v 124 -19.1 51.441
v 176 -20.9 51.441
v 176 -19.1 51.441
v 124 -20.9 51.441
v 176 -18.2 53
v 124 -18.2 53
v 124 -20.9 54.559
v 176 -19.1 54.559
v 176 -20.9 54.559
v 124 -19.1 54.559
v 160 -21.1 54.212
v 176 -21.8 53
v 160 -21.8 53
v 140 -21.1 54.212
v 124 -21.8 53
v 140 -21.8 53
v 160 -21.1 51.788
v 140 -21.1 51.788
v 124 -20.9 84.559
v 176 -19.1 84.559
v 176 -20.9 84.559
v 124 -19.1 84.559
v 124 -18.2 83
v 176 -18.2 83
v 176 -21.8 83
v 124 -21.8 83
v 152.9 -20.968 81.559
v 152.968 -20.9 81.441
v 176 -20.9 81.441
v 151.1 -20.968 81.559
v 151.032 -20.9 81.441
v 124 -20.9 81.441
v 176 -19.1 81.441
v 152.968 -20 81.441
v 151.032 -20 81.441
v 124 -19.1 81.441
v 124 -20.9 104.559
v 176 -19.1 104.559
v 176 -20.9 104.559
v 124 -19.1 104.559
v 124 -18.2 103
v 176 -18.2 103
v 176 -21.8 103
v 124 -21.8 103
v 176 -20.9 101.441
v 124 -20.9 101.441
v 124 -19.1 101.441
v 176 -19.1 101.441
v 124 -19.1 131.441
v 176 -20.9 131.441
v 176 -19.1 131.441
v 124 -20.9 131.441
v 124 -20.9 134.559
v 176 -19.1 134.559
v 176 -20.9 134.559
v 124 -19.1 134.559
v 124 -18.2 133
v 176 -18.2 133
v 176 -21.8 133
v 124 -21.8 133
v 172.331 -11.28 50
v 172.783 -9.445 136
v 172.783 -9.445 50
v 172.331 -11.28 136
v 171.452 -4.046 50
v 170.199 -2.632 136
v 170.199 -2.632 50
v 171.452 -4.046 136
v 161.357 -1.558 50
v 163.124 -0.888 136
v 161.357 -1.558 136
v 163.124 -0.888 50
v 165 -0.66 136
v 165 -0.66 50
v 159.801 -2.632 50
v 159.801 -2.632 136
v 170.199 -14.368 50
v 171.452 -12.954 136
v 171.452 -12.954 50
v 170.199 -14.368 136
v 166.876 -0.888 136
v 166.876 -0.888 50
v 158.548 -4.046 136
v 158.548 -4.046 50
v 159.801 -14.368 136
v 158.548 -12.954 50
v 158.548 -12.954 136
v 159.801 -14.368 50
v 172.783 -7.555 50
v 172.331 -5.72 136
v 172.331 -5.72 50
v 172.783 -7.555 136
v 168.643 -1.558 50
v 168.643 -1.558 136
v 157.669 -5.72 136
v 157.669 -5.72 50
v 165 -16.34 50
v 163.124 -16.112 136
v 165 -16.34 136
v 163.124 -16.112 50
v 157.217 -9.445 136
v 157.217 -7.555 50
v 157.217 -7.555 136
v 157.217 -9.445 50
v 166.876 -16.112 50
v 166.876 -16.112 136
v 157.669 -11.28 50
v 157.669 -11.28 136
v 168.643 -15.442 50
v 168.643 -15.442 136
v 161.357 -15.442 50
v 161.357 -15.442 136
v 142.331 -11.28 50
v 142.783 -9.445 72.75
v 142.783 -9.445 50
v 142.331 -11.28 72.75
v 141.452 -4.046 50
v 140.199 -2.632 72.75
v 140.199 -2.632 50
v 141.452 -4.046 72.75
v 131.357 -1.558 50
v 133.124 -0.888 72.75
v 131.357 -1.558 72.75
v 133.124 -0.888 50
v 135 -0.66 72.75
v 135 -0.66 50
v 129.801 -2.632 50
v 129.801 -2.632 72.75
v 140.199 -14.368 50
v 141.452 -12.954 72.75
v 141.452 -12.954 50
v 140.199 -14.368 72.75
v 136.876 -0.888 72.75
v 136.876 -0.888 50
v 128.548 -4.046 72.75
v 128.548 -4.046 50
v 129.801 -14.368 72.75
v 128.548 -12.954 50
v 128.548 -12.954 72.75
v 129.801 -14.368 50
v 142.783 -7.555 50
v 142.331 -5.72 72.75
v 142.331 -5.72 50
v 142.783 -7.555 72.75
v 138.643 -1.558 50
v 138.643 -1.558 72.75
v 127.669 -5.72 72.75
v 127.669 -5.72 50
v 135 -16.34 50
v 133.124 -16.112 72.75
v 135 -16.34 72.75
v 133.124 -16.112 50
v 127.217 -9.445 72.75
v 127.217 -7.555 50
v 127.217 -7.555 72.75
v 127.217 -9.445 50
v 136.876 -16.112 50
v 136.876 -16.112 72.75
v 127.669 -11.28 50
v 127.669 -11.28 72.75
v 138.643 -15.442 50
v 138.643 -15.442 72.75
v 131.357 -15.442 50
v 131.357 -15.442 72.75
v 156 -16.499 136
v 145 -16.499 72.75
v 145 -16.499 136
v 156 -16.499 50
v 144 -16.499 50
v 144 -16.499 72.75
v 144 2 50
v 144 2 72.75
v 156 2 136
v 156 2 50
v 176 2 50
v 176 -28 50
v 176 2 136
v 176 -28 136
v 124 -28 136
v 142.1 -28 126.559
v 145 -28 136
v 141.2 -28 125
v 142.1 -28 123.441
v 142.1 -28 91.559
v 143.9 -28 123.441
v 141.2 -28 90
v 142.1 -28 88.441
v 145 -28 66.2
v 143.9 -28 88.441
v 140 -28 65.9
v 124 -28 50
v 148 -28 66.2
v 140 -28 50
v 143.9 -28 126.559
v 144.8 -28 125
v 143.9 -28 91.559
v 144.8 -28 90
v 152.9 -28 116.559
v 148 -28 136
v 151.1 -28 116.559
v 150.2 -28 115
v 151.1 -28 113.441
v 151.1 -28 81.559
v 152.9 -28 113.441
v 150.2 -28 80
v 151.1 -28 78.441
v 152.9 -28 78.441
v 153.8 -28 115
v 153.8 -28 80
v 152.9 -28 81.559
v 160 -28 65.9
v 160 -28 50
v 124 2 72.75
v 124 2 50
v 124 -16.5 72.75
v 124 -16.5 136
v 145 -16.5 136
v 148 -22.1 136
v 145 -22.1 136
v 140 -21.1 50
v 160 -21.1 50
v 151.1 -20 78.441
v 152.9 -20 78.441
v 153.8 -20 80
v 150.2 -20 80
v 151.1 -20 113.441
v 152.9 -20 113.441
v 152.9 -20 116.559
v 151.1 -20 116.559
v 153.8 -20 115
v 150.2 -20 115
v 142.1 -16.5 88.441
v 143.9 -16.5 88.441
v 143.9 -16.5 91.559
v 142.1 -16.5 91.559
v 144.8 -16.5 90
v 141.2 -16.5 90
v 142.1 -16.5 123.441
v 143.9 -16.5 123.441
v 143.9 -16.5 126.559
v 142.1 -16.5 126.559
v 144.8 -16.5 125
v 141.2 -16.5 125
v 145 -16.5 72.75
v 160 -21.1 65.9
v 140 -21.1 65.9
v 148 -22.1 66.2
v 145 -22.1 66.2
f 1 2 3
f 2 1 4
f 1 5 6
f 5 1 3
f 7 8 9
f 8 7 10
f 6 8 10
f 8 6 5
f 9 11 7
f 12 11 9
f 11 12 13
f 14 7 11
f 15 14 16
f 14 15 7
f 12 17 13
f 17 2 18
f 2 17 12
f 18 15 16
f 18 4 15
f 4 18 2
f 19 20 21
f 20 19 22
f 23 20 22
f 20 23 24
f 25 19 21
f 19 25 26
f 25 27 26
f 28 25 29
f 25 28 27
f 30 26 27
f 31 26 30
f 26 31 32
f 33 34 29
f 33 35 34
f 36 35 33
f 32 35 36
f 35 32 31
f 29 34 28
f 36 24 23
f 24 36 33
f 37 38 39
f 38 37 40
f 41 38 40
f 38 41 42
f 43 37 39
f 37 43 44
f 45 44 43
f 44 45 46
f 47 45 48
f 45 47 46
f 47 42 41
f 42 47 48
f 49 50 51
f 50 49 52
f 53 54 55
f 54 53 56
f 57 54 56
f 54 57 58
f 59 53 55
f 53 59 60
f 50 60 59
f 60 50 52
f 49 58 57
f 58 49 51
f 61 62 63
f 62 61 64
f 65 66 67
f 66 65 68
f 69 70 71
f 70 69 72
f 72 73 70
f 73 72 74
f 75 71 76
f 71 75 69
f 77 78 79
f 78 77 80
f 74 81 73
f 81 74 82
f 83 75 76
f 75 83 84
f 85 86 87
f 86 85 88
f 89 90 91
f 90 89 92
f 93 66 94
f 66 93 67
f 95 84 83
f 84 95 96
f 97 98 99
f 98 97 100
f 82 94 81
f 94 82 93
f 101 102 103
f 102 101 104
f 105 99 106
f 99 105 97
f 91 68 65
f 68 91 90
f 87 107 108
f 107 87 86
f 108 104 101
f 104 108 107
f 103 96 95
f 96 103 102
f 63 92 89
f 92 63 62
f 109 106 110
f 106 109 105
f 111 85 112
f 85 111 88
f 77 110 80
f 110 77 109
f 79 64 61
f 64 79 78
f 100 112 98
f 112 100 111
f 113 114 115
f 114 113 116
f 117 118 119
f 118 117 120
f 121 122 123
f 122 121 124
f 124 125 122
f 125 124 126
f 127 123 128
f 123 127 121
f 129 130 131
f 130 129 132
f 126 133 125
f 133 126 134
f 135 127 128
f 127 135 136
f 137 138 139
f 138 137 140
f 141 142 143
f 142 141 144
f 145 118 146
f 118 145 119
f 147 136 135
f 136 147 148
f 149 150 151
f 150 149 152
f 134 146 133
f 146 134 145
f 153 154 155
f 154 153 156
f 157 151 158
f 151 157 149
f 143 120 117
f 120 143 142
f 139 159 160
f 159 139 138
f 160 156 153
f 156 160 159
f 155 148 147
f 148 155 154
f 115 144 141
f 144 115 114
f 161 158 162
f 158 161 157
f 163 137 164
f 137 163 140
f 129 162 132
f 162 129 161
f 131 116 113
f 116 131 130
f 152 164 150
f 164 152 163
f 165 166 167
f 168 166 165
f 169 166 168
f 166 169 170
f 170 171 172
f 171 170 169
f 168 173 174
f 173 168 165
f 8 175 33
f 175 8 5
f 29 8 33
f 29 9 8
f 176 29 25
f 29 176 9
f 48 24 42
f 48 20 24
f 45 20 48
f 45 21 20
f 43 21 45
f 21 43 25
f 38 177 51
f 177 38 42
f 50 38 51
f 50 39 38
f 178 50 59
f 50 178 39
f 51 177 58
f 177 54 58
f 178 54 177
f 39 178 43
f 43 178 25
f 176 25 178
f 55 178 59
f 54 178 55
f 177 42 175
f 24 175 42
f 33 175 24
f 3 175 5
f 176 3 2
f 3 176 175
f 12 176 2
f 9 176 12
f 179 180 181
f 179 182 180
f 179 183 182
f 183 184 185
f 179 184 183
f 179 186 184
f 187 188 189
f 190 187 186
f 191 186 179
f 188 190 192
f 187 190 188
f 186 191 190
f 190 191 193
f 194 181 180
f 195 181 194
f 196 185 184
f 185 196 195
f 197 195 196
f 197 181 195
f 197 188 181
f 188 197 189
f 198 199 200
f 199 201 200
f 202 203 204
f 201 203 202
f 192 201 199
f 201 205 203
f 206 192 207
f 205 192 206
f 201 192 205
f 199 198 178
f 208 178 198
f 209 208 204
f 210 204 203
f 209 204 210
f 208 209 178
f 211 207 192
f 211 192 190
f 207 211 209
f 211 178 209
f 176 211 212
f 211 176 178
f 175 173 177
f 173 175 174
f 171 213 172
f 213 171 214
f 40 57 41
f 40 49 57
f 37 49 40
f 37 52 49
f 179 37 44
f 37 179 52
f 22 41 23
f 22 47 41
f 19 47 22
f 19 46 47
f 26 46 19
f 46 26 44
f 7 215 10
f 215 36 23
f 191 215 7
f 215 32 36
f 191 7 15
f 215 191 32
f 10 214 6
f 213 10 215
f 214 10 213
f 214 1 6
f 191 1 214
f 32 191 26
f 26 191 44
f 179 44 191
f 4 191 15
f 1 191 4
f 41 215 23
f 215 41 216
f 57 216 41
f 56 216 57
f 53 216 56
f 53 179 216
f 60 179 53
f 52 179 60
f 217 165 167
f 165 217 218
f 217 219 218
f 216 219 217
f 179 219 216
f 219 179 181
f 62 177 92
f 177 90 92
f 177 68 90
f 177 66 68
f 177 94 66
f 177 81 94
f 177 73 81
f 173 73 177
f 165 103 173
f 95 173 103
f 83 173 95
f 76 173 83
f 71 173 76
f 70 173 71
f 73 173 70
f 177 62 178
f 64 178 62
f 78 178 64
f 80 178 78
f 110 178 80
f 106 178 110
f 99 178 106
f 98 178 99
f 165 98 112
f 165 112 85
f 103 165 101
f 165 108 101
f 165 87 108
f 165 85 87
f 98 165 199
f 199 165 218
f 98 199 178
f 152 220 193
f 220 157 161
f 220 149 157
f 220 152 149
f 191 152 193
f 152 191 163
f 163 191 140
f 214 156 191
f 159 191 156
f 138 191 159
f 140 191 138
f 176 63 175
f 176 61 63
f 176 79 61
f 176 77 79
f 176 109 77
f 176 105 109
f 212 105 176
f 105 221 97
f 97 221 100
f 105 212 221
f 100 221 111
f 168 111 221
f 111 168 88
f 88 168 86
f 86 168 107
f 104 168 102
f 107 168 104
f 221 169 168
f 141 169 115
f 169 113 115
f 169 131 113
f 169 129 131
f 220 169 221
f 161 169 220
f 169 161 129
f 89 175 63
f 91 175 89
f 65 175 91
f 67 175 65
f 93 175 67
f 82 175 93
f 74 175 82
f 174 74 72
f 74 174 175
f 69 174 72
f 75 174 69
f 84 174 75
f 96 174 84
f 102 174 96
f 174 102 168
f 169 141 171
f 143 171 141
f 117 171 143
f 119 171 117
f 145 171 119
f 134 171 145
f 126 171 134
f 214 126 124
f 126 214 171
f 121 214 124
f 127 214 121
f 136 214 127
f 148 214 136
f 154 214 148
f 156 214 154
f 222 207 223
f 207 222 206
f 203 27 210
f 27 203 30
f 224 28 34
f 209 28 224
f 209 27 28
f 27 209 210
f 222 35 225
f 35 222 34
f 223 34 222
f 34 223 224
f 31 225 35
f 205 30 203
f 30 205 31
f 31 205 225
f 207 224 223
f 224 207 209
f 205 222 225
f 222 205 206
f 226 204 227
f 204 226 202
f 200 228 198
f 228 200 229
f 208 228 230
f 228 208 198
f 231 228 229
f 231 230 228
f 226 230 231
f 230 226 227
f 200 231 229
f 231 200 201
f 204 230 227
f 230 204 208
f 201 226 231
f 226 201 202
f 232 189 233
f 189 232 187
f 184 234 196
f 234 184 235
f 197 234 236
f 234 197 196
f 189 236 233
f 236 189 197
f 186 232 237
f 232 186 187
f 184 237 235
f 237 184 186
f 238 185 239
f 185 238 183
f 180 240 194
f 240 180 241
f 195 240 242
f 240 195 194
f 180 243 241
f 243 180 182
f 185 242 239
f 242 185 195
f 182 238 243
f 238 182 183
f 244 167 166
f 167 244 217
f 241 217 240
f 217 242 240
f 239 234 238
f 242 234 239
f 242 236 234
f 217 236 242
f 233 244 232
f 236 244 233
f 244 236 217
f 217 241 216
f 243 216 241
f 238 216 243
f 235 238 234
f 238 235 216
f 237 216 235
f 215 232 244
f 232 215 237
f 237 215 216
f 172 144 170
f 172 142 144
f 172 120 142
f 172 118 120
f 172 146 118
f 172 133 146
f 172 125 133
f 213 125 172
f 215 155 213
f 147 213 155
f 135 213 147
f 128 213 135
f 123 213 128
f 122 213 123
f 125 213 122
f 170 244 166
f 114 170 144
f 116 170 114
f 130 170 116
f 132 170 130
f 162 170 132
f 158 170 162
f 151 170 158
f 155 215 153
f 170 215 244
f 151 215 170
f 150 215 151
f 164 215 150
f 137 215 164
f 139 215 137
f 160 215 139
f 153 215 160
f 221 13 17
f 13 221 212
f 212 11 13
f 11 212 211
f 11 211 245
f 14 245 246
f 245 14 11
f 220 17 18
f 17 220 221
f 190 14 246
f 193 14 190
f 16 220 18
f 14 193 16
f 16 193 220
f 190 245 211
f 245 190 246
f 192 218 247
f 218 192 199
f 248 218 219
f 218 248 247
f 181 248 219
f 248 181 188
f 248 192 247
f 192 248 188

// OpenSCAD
module lm08uu(){
cylinder(r=16/2,h=24,center=true);
cylinder(r=10/2,h=124,center=true);

}
module belt(l=100,bearing=13,thickness=2.5,width=6, fill=false){
	difference(){
		union(){
			translate([-l/2,0,0])cylinder(r=(bearing+thickness)/2,h=width);
			translate([l/2,0,0])cylinder(r=(bearing+thickness)/2,h=width);
			translate([-l/2,-(bearing+thickness)/2,0])cube([l,(bearing+thickness),width-0.001]);
		}
		if(fill==true){
			translate([-l/2,0,-0.5])cylinder(r=bearing/2,h=width+2);
			translate([l/2,0,-0.5])cylinder(r=bearing/2,h=width+2);
			translate([-l/2,-bearing/2,-0.5])cube([l,bearing,width+1.999]);
		}
	}
}

*lm08uu();
*belt(100);

rotate([90,0,0])difference(){
translate([124,50,-2])cube([52,86,30]);
translate([152,80,28-8])cylinder(r=1.8,h=30);
translate([152,80+35,28-8])cylinder(r=1.8,h=30);
#translate([143,90,0])cylinder(r=1.8,h=30);
#translate([143,90+35,0])cylinder(r=1.8,h=30);
translate([115,53,20])rotate([0,90,0]){
cylinder(r=1.8,h=70);
translate([0,30,0])cylinder(r=1.8,h=70);
translate([0,50,0])cylinder(r=1.8,h=70);
translate([0,80,0])cylinder(r=1.8,h=70);
}

translate([95,71+1.75,-33.5])cube([50,80,50]);
#translate([140,49.9,21.1])cube([20,16,7]);
#translate([145,49.9+16.3,22.1])cube([3,150,7]);
#translate([165,61.75,8.5])rotate([0,90,90])scale(0.98)lm08uu();
translate([165,80,8.5])rotate([0,90,90])scale(0.98)lm08uu();
translate([165,100,8.5])rotate([0,90,90])scale(0.98)lm08uu();
translate([165,120,8.5])rotate([0,90,90])scale(0.98)lm08uu();
translate([165,140,8.5])rotate([0,90,90])scale(0.98)lm08uu();
translate([135,61.75,8.5])rotate([0,90,90])scale(0.98)lm08uu();
#translate([135,-30,8.5])rotate([0,90,90])color([0.2,0.2,0.5])cylinder(r=5.25,h=300);
translate([150,63+12,-3.5])rotate([0,0,90])belt(150,bearing=4.5,width=20,thickness=7.5,fil=true);
}
